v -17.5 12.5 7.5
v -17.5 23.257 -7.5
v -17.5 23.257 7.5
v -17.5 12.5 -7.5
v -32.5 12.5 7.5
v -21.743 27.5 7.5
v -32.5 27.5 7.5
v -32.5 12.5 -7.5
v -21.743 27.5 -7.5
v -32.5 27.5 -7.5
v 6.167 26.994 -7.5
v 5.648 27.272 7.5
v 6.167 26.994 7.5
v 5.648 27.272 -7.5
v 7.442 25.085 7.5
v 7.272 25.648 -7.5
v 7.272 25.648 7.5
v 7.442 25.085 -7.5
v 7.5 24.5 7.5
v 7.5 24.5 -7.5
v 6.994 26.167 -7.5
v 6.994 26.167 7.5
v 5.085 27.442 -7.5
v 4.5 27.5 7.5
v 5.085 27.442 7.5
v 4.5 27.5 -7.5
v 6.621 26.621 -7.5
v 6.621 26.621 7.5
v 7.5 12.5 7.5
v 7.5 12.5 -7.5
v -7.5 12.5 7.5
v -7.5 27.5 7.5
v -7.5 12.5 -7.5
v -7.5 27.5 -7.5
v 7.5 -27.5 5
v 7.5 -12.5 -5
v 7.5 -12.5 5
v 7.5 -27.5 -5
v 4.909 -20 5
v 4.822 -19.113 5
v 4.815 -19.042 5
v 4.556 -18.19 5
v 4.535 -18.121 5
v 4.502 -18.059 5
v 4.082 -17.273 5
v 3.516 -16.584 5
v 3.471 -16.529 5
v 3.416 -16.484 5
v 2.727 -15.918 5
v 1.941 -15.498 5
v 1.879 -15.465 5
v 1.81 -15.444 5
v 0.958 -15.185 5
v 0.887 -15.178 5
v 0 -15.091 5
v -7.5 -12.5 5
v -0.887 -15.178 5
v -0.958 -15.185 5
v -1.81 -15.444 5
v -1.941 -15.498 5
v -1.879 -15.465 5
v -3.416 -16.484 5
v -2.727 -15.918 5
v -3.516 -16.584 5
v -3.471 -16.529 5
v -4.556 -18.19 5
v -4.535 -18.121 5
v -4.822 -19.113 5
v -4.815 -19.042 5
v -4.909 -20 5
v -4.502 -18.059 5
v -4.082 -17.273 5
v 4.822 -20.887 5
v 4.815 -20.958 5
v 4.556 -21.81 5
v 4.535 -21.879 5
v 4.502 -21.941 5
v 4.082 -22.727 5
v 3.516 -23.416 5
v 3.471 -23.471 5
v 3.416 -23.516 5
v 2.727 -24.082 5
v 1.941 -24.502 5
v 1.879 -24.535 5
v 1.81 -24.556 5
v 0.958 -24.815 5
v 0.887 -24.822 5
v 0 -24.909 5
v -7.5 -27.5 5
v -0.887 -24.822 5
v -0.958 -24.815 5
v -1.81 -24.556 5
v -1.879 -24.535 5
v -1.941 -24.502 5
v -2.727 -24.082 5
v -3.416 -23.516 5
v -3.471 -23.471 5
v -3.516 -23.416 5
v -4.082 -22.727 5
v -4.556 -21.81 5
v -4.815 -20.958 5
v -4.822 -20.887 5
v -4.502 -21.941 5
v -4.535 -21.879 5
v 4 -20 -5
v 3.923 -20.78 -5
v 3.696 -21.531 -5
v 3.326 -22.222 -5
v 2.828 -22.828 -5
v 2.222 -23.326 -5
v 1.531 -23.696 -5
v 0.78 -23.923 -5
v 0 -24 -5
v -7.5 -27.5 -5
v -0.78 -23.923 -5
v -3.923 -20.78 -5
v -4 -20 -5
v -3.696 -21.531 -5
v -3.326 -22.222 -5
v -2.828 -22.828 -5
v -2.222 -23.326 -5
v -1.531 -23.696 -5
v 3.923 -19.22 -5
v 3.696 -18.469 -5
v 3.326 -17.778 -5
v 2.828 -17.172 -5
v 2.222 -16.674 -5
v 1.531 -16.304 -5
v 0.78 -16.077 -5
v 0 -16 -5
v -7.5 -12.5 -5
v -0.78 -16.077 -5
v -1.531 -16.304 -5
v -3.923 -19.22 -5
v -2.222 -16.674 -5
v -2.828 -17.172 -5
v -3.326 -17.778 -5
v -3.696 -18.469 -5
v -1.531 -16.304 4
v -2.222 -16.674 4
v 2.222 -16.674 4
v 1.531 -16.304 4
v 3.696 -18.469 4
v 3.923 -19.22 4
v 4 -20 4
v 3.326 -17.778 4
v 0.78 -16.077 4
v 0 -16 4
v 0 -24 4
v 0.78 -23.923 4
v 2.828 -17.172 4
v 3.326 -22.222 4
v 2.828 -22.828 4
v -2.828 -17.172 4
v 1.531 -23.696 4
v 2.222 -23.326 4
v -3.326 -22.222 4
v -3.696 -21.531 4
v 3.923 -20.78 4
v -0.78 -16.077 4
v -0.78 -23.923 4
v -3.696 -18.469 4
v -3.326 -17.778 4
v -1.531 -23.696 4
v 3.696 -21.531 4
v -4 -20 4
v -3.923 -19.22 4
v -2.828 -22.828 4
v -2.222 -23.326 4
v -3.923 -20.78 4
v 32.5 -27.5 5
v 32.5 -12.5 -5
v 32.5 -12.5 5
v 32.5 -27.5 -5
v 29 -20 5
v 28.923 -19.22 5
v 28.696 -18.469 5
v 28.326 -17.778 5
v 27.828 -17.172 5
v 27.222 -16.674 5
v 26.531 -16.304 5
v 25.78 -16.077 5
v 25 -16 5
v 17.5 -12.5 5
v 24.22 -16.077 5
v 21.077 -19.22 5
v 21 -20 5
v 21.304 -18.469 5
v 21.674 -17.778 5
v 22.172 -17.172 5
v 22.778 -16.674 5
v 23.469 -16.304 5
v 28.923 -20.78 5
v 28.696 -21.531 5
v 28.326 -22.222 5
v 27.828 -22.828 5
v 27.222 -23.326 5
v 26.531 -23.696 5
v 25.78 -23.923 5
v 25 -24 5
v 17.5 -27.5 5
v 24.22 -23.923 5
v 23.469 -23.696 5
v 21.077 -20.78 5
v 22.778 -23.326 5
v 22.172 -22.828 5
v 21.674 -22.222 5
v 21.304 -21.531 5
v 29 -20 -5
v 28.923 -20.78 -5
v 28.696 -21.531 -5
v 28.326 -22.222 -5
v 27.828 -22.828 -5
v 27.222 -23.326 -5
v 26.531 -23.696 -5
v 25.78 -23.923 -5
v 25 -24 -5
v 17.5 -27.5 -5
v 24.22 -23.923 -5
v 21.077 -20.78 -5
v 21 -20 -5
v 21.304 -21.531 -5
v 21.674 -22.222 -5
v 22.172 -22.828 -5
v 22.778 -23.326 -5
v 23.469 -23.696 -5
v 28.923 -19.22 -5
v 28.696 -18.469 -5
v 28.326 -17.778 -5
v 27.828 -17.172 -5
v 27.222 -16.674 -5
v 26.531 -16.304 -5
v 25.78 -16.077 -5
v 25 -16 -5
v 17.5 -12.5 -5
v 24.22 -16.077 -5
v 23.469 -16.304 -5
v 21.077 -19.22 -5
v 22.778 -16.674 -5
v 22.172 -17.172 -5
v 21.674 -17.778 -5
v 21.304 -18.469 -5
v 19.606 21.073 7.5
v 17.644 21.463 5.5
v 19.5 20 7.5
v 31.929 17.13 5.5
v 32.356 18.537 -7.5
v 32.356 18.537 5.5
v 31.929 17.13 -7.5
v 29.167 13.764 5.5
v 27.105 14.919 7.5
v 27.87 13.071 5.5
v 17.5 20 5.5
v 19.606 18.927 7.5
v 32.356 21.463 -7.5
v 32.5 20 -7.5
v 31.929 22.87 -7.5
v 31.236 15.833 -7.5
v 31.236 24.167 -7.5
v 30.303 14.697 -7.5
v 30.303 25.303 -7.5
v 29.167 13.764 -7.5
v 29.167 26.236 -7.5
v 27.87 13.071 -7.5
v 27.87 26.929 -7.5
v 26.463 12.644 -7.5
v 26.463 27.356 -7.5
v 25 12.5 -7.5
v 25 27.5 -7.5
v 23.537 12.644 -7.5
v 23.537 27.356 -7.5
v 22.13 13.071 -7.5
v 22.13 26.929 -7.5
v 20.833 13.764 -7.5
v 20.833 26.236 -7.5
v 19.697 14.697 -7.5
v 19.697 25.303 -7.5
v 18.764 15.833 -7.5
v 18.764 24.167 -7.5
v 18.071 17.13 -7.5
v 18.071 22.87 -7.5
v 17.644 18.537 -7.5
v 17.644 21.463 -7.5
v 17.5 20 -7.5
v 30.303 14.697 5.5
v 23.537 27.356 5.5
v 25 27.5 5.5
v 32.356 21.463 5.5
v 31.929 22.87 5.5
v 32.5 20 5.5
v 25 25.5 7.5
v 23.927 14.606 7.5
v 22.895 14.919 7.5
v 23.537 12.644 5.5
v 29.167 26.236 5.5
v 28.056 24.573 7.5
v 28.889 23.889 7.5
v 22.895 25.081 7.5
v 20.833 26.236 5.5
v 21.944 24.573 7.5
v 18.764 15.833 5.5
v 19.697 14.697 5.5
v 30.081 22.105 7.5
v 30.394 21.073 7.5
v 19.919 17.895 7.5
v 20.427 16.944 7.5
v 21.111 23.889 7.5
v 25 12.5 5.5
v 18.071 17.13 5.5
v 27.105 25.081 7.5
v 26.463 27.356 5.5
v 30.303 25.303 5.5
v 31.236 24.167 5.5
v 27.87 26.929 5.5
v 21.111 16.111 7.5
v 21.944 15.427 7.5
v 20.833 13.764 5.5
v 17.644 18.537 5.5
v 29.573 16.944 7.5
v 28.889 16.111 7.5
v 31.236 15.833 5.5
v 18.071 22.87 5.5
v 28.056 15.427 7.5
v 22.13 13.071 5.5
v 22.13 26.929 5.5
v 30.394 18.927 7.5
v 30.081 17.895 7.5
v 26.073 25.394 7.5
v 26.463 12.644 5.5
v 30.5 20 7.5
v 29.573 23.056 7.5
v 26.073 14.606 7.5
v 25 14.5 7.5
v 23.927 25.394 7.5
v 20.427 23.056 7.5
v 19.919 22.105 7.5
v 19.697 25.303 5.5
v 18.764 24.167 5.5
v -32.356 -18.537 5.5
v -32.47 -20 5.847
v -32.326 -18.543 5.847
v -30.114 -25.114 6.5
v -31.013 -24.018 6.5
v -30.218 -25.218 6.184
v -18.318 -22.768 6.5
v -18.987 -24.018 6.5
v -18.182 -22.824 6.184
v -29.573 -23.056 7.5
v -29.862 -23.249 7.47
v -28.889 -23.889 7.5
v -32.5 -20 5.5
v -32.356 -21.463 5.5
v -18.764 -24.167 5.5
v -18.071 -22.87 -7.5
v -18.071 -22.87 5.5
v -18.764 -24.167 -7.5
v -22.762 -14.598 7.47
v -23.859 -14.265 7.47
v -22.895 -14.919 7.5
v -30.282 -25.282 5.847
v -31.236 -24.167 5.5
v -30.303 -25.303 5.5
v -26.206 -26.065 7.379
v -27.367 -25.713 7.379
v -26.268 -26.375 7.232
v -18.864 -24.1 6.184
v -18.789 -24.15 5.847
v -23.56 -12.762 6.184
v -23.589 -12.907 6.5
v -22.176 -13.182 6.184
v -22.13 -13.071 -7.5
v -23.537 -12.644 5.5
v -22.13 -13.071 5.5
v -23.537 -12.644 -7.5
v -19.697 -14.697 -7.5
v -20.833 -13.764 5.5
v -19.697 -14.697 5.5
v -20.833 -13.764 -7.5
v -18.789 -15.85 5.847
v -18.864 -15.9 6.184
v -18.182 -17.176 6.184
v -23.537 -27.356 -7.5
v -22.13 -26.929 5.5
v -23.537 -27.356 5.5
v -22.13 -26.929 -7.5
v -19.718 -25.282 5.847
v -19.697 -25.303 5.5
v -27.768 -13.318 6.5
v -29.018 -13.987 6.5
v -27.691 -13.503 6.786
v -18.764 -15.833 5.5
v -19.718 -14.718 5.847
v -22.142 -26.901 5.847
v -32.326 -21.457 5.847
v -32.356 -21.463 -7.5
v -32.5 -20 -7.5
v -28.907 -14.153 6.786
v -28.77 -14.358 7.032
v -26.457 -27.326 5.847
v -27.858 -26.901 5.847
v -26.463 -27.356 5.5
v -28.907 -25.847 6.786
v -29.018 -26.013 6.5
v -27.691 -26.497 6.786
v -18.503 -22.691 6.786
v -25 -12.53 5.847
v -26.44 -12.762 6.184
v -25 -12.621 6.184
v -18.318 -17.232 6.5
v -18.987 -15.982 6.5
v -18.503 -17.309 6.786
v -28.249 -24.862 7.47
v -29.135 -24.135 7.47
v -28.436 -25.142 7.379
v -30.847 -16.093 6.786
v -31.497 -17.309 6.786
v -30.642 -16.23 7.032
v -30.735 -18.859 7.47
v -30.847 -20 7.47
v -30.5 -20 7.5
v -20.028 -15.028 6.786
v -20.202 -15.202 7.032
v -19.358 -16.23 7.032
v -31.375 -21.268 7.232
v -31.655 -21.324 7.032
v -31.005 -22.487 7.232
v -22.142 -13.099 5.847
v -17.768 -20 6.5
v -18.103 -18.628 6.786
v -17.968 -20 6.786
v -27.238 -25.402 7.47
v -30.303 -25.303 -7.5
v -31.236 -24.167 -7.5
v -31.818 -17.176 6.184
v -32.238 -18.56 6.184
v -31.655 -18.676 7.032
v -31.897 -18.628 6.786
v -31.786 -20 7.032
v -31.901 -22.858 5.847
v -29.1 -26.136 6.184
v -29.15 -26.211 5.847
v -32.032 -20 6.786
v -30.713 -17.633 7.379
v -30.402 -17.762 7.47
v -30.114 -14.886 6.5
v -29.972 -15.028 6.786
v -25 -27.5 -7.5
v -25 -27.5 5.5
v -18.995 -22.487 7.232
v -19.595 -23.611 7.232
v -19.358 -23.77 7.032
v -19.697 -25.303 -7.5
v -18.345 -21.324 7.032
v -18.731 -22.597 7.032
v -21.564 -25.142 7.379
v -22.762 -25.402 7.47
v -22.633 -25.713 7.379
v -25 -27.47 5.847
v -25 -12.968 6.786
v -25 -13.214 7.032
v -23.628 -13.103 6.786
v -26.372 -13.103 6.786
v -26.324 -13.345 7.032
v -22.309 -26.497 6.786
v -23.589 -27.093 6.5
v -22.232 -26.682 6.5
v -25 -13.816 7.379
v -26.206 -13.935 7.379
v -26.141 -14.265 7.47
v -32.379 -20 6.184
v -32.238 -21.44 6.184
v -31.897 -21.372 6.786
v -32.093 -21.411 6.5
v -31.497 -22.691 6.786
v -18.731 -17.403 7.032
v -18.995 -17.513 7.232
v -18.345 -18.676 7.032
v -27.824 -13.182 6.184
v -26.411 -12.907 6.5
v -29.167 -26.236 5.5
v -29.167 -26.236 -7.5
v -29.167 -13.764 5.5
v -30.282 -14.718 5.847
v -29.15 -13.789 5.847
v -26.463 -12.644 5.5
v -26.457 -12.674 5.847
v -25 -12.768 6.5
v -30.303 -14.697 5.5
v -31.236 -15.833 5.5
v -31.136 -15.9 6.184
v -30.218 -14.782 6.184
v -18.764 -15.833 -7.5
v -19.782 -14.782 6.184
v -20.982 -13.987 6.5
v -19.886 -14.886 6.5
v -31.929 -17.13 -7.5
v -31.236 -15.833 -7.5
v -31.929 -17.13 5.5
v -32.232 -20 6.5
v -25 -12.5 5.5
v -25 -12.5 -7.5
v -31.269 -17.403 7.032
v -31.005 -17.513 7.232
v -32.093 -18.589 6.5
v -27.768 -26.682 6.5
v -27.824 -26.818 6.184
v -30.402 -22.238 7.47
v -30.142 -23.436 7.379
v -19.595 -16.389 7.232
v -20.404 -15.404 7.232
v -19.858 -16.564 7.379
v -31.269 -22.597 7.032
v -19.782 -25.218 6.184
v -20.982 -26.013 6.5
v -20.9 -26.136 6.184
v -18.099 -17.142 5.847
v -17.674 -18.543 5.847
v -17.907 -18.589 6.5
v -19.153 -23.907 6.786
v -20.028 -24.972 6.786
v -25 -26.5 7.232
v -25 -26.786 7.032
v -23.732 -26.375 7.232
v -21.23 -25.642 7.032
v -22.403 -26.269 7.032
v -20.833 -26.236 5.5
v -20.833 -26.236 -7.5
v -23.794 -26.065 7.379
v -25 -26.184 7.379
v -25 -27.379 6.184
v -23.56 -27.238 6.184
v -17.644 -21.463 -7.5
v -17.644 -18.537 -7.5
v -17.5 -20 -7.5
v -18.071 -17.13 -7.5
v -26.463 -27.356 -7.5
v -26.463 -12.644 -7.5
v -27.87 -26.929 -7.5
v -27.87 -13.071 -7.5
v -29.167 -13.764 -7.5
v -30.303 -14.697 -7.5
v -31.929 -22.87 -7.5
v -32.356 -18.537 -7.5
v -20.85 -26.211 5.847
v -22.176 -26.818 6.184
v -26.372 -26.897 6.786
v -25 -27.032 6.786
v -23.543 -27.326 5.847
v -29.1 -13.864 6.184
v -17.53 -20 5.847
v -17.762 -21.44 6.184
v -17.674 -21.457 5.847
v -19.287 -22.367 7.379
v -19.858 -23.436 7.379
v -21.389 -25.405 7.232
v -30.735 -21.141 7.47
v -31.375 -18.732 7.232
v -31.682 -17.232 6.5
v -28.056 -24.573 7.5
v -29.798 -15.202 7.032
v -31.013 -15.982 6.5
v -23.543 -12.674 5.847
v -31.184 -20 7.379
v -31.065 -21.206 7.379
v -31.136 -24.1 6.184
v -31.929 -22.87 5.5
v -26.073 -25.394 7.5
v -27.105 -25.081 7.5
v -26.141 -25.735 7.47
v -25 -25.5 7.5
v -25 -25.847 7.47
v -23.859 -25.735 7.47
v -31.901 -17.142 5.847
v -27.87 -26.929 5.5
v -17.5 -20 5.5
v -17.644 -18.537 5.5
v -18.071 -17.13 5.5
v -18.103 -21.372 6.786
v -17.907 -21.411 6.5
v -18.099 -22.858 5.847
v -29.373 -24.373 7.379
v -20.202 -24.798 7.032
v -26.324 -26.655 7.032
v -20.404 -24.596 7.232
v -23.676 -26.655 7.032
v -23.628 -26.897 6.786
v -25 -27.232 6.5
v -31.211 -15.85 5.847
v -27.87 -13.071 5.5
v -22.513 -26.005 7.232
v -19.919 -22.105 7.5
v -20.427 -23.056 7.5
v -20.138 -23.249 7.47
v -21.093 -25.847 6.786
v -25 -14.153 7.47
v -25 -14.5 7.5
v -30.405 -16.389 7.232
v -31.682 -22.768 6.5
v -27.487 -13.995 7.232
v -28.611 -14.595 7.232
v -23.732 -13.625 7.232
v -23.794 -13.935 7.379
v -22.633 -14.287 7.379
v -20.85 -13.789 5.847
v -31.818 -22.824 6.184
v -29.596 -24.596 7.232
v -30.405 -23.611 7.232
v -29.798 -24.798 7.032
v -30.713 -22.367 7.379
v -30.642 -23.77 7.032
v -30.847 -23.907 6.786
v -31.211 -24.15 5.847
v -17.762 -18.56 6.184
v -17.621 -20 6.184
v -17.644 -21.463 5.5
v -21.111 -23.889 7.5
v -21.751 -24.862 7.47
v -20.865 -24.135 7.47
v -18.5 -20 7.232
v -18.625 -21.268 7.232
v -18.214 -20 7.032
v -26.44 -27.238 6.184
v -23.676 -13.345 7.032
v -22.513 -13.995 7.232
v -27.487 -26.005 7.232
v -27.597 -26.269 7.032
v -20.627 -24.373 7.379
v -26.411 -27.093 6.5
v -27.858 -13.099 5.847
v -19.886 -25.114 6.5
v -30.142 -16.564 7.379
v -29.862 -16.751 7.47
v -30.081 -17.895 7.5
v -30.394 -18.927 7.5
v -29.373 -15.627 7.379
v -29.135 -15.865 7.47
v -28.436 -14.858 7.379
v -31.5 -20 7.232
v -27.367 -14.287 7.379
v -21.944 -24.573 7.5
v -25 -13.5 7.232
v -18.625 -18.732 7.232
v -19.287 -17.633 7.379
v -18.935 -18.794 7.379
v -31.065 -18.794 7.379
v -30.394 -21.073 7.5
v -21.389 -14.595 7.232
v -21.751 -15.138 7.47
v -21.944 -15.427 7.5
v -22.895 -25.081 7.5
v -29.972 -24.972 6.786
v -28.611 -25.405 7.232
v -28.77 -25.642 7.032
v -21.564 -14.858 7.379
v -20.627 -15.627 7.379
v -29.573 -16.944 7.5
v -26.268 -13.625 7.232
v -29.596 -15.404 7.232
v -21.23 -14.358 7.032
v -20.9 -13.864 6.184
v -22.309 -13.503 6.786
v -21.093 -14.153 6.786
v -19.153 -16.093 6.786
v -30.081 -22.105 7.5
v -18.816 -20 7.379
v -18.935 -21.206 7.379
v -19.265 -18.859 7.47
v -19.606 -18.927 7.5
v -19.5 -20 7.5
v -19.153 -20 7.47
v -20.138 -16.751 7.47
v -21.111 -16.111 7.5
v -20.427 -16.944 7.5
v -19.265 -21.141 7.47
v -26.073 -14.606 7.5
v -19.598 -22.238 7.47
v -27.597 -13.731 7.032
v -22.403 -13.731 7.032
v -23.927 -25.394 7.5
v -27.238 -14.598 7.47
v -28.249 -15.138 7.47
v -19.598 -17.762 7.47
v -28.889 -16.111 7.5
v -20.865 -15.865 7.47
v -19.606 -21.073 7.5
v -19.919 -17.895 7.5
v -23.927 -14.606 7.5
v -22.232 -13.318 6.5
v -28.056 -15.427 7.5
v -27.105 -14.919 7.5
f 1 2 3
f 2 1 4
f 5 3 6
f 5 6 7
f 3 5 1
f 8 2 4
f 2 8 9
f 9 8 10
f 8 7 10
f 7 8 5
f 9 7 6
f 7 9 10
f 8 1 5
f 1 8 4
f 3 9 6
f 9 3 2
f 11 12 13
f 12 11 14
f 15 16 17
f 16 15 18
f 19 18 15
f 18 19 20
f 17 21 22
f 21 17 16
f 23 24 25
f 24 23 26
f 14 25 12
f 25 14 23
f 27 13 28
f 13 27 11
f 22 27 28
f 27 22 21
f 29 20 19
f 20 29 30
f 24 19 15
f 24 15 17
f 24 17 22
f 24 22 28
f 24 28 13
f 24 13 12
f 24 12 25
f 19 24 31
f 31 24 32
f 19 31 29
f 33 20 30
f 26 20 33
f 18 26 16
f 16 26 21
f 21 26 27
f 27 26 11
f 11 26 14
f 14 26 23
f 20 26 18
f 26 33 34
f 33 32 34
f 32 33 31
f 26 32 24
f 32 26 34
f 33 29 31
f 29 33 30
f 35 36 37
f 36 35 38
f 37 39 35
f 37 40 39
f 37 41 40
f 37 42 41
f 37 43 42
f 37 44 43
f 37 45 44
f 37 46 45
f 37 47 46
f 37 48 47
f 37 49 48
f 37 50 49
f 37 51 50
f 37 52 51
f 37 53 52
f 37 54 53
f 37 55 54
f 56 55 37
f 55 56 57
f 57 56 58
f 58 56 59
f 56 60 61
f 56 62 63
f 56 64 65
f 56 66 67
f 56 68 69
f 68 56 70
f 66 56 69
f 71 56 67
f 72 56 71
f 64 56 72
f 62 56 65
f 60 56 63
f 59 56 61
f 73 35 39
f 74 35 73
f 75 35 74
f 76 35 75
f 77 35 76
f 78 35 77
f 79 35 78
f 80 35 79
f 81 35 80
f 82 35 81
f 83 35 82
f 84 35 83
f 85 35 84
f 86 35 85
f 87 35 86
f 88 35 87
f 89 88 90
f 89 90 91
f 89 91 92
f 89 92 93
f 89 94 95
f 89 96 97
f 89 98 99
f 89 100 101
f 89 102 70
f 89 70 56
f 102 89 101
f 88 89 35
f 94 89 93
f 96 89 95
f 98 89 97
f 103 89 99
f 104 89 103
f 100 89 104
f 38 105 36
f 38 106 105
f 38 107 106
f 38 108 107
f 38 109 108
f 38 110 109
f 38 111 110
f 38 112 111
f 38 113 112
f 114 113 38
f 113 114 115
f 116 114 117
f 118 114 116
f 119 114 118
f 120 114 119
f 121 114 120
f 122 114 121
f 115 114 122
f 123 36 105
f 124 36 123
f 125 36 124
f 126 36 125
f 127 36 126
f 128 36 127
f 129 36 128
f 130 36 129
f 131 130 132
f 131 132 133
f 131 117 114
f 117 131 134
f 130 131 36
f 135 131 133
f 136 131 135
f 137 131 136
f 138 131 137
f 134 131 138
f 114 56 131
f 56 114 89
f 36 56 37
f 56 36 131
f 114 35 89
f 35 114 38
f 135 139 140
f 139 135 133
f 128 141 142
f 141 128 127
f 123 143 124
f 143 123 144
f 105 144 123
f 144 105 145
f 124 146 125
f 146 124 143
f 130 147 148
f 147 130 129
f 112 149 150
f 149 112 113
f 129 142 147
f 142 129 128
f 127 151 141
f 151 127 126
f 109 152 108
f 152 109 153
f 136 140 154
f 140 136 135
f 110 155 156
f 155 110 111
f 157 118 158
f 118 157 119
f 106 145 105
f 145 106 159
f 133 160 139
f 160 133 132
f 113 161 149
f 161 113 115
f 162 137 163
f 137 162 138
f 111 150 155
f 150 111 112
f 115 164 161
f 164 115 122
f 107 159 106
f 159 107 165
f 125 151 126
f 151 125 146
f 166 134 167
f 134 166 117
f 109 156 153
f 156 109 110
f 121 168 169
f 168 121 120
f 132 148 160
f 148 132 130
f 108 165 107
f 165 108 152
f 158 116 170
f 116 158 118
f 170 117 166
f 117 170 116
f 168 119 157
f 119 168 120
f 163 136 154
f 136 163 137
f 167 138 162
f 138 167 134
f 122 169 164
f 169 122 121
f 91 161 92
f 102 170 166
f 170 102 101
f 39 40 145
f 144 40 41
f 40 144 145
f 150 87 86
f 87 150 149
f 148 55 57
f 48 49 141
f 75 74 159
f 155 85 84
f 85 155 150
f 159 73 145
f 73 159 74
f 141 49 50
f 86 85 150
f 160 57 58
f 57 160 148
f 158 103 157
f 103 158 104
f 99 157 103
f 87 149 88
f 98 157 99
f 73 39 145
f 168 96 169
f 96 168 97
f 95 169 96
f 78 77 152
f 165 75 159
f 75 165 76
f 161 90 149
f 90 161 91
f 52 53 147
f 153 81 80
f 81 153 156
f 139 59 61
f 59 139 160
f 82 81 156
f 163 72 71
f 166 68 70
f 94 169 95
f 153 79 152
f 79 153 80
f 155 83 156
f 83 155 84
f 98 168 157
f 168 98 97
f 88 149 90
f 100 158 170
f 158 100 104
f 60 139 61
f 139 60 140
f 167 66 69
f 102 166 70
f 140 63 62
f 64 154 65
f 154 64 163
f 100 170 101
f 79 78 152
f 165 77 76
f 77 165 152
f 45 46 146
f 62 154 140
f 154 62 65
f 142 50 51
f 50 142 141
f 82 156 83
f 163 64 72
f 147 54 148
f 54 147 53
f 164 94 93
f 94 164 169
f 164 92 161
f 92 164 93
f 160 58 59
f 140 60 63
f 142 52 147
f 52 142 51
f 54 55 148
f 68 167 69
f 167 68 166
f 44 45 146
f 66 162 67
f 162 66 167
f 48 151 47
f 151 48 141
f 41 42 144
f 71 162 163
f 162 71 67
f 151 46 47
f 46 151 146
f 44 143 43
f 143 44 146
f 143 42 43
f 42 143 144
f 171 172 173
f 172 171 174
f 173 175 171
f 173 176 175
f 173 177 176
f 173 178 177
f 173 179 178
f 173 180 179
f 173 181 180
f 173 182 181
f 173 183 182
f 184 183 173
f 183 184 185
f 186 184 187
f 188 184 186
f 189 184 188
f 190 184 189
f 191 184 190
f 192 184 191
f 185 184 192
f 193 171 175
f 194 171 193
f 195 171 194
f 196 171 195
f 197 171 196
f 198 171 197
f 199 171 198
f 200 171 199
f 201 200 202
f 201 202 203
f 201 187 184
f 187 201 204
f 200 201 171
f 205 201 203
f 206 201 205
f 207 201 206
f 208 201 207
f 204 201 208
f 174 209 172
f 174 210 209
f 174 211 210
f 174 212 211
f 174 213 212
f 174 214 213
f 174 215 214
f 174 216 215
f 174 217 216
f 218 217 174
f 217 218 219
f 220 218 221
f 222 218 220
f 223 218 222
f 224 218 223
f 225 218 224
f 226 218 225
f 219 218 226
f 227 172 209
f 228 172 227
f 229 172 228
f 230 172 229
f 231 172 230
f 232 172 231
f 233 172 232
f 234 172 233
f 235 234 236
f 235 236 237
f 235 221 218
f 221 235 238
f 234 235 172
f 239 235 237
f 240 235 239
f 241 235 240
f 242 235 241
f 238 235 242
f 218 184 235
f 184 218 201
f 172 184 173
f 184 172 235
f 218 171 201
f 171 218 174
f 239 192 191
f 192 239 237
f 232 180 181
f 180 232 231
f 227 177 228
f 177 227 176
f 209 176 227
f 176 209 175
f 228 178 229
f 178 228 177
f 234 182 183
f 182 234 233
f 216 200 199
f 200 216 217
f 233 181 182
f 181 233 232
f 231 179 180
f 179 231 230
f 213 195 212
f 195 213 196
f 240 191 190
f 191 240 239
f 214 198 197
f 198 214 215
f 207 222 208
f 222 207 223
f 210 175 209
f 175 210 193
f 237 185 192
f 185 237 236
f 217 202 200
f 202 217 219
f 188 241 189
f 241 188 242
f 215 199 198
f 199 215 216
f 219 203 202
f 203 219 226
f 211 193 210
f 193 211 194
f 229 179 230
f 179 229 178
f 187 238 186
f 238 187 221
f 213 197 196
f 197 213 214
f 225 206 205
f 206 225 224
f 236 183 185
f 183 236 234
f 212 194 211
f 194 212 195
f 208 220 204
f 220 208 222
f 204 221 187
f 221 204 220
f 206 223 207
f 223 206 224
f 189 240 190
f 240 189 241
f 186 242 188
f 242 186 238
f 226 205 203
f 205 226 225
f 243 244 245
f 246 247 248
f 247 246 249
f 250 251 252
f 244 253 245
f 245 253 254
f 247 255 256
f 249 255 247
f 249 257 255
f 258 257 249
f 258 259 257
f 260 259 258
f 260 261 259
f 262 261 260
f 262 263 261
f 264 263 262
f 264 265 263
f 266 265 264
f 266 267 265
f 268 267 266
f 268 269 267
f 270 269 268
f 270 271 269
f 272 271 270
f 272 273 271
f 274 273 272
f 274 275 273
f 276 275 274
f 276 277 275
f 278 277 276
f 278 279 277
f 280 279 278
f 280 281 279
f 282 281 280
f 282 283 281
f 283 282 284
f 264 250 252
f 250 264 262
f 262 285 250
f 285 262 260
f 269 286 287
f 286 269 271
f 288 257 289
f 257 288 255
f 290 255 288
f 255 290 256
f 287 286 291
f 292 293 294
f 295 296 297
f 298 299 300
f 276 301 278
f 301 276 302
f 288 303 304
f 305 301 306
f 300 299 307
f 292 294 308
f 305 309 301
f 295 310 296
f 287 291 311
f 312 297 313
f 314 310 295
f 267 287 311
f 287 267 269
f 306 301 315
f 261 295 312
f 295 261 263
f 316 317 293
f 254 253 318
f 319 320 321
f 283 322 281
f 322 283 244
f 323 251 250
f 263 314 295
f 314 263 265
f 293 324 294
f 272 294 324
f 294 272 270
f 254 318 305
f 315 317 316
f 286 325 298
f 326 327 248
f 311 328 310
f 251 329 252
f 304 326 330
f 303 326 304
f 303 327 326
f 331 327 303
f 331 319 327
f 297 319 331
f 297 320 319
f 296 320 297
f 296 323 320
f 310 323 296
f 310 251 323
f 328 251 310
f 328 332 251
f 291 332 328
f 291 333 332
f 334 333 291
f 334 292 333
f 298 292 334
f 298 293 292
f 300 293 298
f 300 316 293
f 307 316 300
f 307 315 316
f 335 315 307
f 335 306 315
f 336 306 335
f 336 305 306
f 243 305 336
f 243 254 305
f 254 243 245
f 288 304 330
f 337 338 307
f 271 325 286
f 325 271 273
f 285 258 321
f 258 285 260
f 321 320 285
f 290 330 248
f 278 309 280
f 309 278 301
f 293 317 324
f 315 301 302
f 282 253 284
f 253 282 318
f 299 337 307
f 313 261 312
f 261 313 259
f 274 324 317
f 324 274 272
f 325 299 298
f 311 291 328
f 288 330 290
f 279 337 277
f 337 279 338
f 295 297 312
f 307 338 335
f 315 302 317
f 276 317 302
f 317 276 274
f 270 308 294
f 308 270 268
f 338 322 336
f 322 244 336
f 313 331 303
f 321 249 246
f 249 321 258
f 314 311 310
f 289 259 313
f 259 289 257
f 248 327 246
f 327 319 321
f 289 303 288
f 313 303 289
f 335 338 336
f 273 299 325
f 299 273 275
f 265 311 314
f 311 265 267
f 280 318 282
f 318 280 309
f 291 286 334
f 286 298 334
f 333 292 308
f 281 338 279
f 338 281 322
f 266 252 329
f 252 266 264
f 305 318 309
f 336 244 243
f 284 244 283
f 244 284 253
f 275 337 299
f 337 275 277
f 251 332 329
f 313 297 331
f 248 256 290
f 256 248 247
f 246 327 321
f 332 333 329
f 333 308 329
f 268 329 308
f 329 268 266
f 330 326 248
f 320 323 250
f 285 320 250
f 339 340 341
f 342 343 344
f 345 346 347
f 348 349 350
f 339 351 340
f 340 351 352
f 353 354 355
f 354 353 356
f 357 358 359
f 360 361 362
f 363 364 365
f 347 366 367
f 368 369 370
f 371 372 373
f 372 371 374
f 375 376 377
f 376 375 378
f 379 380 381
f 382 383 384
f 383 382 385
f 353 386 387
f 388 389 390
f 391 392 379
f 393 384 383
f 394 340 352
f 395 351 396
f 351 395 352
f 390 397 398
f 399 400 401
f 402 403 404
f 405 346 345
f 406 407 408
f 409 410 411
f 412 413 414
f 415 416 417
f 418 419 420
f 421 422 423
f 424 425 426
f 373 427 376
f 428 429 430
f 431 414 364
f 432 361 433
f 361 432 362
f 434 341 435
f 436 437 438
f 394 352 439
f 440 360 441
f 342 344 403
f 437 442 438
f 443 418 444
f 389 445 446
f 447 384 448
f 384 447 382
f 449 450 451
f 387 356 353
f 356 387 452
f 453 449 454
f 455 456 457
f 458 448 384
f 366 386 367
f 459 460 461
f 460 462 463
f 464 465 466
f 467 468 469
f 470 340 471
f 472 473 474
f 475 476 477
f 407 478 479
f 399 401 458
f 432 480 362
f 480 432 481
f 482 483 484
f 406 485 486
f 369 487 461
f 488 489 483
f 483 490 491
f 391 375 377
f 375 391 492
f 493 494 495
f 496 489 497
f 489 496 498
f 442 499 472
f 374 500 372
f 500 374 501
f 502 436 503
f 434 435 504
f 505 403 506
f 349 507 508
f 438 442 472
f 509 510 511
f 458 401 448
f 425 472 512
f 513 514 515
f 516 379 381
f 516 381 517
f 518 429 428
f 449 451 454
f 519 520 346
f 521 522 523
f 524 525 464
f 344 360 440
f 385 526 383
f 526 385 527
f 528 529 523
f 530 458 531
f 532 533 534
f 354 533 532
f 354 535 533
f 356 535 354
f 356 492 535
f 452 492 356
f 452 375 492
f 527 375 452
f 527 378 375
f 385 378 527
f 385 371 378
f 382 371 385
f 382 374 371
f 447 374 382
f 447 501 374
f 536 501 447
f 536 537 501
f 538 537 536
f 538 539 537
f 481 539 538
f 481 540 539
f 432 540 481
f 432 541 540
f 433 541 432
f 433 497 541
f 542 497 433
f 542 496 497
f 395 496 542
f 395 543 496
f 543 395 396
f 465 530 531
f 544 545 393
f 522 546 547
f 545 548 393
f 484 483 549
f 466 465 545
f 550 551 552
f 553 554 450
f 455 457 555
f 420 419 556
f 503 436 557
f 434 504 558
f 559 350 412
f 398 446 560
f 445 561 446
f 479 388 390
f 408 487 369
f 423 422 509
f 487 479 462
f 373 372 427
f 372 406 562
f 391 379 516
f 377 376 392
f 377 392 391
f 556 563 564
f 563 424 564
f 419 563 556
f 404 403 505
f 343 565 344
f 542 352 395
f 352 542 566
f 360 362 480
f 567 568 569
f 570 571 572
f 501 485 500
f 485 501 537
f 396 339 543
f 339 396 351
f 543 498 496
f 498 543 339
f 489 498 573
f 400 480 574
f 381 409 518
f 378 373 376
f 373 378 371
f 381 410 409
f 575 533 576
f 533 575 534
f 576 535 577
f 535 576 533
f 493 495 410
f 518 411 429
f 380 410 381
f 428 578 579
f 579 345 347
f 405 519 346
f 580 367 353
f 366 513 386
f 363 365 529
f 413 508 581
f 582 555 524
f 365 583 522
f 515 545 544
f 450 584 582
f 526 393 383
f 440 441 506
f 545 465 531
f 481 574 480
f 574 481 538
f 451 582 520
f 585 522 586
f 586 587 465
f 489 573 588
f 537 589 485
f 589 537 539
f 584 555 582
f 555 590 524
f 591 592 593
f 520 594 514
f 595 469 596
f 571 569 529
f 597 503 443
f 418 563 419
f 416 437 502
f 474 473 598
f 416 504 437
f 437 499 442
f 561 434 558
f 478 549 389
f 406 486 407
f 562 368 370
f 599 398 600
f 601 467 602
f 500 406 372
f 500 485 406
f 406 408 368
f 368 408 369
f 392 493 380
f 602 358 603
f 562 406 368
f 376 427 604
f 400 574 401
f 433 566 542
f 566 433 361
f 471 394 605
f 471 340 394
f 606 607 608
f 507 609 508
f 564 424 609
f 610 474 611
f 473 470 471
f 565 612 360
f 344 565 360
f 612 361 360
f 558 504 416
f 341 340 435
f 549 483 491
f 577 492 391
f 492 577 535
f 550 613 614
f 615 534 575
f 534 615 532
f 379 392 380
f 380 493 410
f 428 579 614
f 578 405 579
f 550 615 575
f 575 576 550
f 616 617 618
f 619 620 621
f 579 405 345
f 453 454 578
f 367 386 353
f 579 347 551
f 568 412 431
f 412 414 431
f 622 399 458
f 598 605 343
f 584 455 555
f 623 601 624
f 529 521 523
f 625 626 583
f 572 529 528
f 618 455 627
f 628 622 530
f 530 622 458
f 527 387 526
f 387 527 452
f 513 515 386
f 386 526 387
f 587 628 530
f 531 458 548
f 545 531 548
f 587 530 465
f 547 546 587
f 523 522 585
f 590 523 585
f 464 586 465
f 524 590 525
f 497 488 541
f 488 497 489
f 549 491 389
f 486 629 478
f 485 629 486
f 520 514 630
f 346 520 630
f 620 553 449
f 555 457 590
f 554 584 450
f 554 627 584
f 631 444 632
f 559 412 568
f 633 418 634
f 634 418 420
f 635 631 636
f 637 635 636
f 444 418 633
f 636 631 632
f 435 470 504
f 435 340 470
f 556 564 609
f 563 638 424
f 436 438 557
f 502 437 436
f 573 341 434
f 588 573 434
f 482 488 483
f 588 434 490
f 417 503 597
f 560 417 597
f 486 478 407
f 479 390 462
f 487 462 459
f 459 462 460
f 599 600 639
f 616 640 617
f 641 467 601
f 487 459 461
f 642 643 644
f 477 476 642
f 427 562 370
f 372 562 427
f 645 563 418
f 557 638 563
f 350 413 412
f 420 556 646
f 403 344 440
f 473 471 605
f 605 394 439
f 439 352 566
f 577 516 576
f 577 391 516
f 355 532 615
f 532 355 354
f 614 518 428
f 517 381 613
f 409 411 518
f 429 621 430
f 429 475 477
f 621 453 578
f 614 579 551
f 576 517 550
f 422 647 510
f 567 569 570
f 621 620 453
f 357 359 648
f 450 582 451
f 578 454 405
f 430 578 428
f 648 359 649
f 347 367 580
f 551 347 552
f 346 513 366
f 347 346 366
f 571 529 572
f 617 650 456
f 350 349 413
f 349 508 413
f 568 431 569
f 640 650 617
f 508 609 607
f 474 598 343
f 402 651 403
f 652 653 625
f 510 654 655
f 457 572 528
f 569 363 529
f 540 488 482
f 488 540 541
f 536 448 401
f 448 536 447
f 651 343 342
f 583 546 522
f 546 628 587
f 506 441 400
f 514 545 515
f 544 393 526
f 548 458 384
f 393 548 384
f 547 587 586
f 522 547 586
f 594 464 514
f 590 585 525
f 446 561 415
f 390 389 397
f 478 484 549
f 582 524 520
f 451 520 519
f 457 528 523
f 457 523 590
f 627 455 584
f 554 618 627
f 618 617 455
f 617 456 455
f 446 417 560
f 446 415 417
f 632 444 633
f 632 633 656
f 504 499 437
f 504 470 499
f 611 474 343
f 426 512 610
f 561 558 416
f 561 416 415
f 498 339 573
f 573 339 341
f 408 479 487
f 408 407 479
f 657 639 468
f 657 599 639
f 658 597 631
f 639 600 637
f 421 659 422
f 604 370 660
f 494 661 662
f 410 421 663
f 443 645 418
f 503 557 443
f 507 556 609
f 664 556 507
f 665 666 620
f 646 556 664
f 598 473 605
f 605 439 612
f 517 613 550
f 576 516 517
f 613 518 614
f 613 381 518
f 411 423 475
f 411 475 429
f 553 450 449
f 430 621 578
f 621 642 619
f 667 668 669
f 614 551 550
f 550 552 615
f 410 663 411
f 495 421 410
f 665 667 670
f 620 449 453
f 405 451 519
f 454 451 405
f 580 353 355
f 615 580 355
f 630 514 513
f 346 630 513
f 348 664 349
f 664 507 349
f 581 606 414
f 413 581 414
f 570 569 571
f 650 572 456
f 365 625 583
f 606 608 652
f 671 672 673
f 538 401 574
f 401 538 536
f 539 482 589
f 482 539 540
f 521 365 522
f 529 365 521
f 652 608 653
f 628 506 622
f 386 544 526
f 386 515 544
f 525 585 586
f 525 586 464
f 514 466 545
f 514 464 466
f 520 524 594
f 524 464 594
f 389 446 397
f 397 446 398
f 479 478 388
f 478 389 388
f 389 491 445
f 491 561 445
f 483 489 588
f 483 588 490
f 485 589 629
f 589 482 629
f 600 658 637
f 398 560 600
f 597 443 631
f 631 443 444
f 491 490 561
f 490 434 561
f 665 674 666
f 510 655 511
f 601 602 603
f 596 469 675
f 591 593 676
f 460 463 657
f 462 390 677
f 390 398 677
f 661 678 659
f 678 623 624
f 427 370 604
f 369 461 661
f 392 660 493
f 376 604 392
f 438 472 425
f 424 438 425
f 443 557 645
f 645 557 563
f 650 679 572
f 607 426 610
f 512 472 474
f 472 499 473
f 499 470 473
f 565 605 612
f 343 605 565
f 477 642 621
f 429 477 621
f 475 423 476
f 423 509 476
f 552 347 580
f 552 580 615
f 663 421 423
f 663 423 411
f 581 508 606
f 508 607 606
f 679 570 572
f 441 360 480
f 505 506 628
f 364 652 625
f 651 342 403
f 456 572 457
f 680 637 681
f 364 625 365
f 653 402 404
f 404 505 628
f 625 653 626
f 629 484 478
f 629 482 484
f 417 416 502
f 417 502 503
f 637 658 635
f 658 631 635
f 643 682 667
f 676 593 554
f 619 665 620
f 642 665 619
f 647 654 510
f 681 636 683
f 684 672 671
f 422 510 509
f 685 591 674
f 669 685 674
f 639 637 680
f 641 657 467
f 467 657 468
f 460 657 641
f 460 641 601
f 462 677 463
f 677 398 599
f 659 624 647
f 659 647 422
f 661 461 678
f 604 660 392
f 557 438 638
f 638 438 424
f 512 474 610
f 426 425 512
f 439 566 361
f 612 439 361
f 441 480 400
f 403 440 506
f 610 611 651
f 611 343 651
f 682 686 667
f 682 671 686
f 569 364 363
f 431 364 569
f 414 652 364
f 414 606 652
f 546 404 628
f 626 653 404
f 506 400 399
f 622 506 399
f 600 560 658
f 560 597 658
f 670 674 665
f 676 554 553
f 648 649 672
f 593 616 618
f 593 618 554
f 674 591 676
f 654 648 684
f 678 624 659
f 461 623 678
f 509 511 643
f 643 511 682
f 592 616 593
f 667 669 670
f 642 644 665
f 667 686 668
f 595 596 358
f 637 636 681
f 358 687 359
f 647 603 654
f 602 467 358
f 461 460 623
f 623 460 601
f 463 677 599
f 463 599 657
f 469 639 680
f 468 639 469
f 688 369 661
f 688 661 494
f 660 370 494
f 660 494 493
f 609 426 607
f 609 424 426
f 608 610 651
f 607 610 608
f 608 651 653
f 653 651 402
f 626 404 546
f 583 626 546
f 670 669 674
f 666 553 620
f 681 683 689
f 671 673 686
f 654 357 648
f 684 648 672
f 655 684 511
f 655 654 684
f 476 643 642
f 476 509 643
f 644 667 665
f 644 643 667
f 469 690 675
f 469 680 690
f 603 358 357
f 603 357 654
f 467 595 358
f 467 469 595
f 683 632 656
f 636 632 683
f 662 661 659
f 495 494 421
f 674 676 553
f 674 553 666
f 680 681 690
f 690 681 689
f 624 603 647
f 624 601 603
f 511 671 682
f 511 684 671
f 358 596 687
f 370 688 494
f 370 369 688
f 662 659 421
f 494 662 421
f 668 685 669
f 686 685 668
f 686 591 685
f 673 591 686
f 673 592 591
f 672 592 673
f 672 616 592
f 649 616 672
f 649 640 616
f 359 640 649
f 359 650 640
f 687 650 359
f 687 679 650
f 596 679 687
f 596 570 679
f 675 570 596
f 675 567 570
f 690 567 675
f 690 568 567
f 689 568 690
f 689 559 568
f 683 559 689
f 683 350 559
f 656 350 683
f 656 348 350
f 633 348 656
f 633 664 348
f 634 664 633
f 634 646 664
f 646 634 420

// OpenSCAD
// WebCAD Pure SCAD Masks and Edge Treatments Showcase
// Demonstrates how to implement chamfers, fillets, edge cuts, and hole masks mathematically from scratch.
// NO EXTERNAL LIBRARIES OR BOSL USED.

$fn = 32;

// ==========================================
// ROW 1 (y = 20): Cube Edge Treatments and Chamfer Cylinder
// ==========================================

// 1. Chamfer Cube Edge
echo("--- STARTING TEST 1: Chamfer Edge Mask ---");
translate([-25, 20, 0]) {
    color("crimson") {
        difference() {
            cube([15, 15, 15], center=true);
            // Chamfer cutter rotated 45 degrees cutting the top-right edge
            translate([7.5, 7.5, 0]) {
                rotate([0, 0, 45]) {
                    cube([6, 6, 20], center=true);
                }
            }
        }
    }
}

// 2. Fillet Cube Edge
echo("--- STARTING TEST 2: Fillet Edge Mask ---");
translate([0, 20, 0]) {
    color("gold") {
        difference() {
            cube([15, 15, 15], center=true);
            // Fillet cutter cutting the top-right edge
            translate([7.5 - 3, 7.5 - 3, -10]) {
                difference() {
                    cube([3.1, 3.1, 20], center=false);
                    translate([0, 0, -1]) {
                        cylinder(r=3, h=22, $fn=32);
                    }
                }
            }
        }
    }
}

// 3. Chamfer Cylinder Top Edge
echo("--- STARTING TEST 3: Chamfer Cylinder Mask ---");
translate([25, 20, -7.5]) {
    color("limegreen") {
        // Revolve a beveled profile to build a chamfered cylinder
        chamfer_profile = [
            [0, 0],
            [7.5, 0],
            [7.5, 13],
            [5.5, 15],
            [0, 15]
        ];
        rotate_extrude(angle=360) {
            polygon(points=chamfer_profile);
        }
    }
}


// ==========================================
// ROW 2 (y = -20): Fillet Cylinder and Hole Entrance Treatments
// ==========================================

// 4. Fillet Cylinder Top Edge
echo("--- STARTING TEST 4: Fillet Cylinder Mask ---");
translate([-25, -20, -7.5]) {
    color("teal") {
        // Revolve a profile with a circular top-right corner
        fillet_profile = concat(
            [[0, 0], [7.5, 0]],
            [for (a = [0 : 10 : 90]) [5.5 + 2 * cos(a), 13 + 2 * sin(a)]],
            [[0, 15]]
        );
        rotate_extrude(angle=360) {
            polygon(points=fillet_profile);
        }
    }
}

// 5. Chamfer Hole Mask
echo("--- STARTING TEST 5: Chamfer Hole Mask ---");
translate([0, -20, 0]) {
    color("dodgerblue") {
        difference() {
            cube([15, 15, 10], center=true);
            // Cylinder hole
            cylinder(d=8, h=12, center=true, $fn=32);
            // Conical chamfer cutter at top entrance
            translate([0, 0, 5 - 1]) {
                cylinder(d1=8, d2=10, h=1.1, center=false, $fn=32);
            }
        }
    }
}

// 6. Fillet Hole Mask
echo("--- STARTING TEST 6: Fillet Hole Mask ---");
translate([25, -20, 0]) {
    color("orchid") {
        difference() {
            cube([15, 15, 10], center=true);
            // Cylinder hole
            cylinder(d=8, h=12, center=true, $fn=32);
            // Revolved fillet cutter translated to top of the hole rim (extends above z=5 to avoid coplanar collision)
            translate([0, 0, 5]) {
                rotate_extrude(angle=360) {
                    polygon(points=concat(
                        [[4, 1], [4, 0]],
                        [for (a = [0 : 10 : 90]) [5 - sin(a), -cos(a)]],
                        [[6, -1], [6, 1]]
                    ));
                }
            }
        }
    }
}
